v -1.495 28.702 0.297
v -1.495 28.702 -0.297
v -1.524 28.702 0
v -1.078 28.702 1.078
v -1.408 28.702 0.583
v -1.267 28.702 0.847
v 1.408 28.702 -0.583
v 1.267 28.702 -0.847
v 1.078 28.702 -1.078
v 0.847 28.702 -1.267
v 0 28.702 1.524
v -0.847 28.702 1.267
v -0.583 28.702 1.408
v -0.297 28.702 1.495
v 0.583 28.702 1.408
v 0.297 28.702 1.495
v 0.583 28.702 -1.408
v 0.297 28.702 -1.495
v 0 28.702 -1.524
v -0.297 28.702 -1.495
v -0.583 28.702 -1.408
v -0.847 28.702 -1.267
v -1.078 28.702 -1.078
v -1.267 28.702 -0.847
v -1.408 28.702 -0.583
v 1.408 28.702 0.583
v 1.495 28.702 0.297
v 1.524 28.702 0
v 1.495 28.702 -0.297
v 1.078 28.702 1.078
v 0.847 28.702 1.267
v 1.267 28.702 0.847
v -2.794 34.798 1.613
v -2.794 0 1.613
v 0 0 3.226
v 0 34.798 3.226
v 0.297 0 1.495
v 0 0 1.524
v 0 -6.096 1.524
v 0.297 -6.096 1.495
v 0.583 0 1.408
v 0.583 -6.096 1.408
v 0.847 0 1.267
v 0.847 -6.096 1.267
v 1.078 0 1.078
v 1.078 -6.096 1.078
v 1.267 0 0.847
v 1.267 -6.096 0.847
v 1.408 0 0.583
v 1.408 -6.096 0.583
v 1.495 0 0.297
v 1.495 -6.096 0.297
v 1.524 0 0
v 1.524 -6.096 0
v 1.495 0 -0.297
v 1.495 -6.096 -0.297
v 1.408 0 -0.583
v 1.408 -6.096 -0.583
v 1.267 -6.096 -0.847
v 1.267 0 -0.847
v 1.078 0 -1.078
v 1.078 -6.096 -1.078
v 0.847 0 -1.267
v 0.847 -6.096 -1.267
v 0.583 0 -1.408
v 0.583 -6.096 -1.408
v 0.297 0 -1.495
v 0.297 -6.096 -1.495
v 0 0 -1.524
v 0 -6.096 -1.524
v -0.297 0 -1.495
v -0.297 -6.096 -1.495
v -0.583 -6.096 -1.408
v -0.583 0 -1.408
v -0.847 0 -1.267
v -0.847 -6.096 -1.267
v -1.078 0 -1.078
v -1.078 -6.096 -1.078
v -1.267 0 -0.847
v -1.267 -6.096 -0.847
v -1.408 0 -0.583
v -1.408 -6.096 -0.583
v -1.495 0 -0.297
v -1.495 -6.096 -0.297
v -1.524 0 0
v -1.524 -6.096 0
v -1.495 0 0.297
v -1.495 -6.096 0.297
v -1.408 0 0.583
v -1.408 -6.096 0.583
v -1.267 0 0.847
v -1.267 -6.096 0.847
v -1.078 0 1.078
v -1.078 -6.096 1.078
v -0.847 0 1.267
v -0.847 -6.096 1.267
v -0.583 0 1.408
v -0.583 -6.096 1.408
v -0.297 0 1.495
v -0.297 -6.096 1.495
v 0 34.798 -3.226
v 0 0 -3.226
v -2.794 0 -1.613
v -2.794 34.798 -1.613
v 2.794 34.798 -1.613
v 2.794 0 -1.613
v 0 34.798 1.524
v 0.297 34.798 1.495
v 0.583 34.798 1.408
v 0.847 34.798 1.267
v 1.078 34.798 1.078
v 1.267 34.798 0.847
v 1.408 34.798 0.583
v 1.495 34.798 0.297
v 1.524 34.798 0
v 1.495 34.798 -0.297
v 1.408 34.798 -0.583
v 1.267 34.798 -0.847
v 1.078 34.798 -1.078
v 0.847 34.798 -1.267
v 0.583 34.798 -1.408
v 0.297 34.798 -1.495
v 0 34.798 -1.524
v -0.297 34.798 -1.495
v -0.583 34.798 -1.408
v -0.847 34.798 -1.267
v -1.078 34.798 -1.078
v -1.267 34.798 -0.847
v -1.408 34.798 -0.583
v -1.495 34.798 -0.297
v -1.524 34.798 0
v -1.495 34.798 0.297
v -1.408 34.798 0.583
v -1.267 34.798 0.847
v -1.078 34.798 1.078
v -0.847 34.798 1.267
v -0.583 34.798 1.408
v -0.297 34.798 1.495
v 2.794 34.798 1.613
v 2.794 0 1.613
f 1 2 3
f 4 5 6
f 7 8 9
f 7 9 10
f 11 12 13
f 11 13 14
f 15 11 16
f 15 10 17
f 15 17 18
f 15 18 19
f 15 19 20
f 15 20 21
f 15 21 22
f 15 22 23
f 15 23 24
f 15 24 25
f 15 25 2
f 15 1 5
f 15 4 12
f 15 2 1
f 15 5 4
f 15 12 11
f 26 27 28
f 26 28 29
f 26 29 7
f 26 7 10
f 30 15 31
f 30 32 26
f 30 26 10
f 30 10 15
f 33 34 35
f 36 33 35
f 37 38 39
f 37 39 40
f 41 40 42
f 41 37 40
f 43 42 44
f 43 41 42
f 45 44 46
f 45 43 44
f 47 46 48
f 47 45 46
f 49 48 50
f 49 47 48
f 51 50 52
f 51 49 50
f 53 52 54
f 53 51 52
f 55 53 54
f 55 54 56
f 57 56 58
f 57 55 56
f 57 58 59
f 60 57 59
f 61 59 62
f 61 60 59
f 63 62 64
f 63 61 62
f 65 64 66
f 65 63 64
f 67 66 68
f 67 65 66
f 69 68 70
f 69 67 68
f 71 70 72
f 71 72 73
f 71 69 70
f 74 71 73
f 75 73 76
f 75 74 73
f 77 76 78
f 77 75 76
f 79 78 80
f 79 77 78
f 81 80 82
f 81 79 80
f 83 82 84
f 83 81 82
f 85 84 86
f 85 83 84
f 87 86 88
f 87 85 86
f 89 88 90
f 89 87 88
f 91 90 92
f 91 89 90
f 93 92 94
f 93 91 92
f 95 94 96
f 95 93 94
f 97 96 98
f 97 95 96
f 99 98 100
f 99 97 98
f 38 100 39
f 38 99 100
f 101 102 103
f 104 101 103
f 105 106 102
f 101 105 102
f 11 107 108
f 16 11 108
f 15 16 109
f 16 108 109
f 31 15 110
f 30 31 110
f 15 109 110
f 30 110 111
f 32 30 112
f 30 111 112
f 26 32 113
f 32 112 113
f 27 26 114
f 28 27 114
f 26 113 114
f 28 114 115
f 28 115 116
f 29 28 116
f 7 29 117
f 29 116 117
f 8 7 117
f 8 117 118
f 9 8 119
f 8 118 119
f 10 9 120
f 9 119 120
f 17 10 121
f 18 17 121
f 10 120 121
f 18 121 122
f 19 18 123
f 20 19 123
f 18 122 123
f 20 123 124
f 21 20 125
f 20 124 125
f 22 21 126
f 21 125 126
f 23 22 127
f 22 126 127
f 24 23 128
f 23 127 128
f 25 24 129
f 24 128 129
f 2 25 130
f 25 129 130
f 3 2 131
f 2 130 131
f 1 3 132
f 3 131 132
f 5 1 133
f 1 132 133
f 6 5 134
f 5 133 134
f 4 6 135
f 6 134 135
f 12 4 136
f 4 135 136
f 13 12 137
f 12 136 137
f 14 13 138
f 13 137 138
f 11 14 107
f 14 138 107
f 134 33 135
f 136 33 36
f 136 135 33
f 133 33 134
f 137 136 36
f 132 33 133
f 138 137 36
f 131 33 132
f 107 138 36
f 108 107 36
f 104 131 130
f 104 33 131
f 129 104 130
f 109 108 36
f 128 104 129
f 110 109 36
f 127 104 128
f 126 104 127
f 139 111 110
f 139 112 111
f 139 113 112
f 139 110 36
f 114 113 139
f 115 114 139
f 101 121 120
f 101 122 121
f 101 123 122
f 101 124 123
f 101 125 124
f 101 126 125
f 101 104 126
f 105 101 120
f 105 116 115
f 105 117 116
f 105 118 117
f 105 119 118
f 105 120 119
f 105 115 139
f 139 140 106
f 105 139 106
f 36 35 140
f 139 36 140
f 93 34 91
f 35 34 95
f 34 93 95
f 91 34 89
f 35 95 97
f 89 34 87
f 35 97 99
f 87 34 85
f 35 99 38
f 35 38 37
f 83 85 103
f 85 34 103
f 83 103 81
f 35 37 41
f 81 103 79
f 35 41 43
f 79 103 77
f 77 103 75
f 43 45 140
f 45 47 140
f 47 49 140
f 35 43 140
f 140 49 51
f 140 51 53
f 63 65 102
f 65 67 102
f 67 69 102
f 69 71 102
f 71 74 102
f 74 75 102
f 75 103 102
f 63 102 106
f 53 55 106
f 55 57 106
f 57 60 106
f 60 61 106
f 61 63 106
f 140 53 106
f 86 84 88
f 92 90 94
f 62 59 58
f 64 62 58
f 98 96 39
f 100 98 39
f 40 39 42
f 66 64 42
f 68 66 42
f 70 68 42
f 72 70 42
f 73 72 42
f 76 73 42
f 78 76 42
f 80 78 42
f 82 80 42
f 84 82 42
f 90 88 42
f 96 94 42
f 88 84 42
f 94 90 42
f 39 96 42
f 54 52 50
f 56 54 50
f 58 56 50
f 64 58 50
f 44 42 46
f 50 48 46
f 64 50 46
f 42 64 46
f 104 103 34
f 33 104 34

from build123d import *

# Parameters (mm, degrees)
SKETCH1_R           = 1.524
BOSS_EXTRUDE1_DEPTH = 34.798
SKETCH1_3_R         = 1.524
BOSS_EXTRUDE2_DEPTH = 6.096
CUT_EXTRUDE1_START  = 34.798
SKETCH1_4_R         = 1.524
CUT_EXTRUDE1_DEPTH  = 6.096


with BuildPart() as part:
    # Sketch1 → Boss-Extrude1 (new body)
    with BuildSketch(Plane(origin=(0, 0, 0), x_dir=(1, 0, 0), z_dir=(0, 1, 0))):
        Polygon((-2.794, -1.613116652), (0, -3.226233304), (2.794, -1.613116652), (2.794, 1.613116652), (0, 3.226233304), (-2.794, 1.613116652), align=None)
        Circle(SKETCH1_R, mode=Mode.SUBTRACT)
        Circle(SKETCH1_R)
    extrude(amount=BOSS_EXTRUDE1_DEPTH)

    # Sketch1<3> → Boss-Extrude2 (add)
    with BuildSketch(Plane(origin=(0, 0, 0), x_dir=(1, 0, 0), z_dir=(0, 1, 0))):
        with Locations(Location((0, 0, 0), (0, 0, 270))):
            Circle(SKETCH1_3_R)
    extrude(amount=-BOSS_EXTRUDE2_DEPTH)

    # Sketch1<4> → Cut-Extrude1 (cut)
    with BuildSketch(Plane(origin=(0, 0, 0), x_dir=(1, 0, 0), z_dir=(0, 1, 0)).offset(CUT_EXTRUDE1_START)):
        with Locations(Location((0, 0, 0), (0, 0, 270))):
            Circle(SKETCH1_4_R)
    extrude(amount=-CUT_EXTRUDE1_DEPTH, mode=Mode.SUBTRACT)


solid = part.part
